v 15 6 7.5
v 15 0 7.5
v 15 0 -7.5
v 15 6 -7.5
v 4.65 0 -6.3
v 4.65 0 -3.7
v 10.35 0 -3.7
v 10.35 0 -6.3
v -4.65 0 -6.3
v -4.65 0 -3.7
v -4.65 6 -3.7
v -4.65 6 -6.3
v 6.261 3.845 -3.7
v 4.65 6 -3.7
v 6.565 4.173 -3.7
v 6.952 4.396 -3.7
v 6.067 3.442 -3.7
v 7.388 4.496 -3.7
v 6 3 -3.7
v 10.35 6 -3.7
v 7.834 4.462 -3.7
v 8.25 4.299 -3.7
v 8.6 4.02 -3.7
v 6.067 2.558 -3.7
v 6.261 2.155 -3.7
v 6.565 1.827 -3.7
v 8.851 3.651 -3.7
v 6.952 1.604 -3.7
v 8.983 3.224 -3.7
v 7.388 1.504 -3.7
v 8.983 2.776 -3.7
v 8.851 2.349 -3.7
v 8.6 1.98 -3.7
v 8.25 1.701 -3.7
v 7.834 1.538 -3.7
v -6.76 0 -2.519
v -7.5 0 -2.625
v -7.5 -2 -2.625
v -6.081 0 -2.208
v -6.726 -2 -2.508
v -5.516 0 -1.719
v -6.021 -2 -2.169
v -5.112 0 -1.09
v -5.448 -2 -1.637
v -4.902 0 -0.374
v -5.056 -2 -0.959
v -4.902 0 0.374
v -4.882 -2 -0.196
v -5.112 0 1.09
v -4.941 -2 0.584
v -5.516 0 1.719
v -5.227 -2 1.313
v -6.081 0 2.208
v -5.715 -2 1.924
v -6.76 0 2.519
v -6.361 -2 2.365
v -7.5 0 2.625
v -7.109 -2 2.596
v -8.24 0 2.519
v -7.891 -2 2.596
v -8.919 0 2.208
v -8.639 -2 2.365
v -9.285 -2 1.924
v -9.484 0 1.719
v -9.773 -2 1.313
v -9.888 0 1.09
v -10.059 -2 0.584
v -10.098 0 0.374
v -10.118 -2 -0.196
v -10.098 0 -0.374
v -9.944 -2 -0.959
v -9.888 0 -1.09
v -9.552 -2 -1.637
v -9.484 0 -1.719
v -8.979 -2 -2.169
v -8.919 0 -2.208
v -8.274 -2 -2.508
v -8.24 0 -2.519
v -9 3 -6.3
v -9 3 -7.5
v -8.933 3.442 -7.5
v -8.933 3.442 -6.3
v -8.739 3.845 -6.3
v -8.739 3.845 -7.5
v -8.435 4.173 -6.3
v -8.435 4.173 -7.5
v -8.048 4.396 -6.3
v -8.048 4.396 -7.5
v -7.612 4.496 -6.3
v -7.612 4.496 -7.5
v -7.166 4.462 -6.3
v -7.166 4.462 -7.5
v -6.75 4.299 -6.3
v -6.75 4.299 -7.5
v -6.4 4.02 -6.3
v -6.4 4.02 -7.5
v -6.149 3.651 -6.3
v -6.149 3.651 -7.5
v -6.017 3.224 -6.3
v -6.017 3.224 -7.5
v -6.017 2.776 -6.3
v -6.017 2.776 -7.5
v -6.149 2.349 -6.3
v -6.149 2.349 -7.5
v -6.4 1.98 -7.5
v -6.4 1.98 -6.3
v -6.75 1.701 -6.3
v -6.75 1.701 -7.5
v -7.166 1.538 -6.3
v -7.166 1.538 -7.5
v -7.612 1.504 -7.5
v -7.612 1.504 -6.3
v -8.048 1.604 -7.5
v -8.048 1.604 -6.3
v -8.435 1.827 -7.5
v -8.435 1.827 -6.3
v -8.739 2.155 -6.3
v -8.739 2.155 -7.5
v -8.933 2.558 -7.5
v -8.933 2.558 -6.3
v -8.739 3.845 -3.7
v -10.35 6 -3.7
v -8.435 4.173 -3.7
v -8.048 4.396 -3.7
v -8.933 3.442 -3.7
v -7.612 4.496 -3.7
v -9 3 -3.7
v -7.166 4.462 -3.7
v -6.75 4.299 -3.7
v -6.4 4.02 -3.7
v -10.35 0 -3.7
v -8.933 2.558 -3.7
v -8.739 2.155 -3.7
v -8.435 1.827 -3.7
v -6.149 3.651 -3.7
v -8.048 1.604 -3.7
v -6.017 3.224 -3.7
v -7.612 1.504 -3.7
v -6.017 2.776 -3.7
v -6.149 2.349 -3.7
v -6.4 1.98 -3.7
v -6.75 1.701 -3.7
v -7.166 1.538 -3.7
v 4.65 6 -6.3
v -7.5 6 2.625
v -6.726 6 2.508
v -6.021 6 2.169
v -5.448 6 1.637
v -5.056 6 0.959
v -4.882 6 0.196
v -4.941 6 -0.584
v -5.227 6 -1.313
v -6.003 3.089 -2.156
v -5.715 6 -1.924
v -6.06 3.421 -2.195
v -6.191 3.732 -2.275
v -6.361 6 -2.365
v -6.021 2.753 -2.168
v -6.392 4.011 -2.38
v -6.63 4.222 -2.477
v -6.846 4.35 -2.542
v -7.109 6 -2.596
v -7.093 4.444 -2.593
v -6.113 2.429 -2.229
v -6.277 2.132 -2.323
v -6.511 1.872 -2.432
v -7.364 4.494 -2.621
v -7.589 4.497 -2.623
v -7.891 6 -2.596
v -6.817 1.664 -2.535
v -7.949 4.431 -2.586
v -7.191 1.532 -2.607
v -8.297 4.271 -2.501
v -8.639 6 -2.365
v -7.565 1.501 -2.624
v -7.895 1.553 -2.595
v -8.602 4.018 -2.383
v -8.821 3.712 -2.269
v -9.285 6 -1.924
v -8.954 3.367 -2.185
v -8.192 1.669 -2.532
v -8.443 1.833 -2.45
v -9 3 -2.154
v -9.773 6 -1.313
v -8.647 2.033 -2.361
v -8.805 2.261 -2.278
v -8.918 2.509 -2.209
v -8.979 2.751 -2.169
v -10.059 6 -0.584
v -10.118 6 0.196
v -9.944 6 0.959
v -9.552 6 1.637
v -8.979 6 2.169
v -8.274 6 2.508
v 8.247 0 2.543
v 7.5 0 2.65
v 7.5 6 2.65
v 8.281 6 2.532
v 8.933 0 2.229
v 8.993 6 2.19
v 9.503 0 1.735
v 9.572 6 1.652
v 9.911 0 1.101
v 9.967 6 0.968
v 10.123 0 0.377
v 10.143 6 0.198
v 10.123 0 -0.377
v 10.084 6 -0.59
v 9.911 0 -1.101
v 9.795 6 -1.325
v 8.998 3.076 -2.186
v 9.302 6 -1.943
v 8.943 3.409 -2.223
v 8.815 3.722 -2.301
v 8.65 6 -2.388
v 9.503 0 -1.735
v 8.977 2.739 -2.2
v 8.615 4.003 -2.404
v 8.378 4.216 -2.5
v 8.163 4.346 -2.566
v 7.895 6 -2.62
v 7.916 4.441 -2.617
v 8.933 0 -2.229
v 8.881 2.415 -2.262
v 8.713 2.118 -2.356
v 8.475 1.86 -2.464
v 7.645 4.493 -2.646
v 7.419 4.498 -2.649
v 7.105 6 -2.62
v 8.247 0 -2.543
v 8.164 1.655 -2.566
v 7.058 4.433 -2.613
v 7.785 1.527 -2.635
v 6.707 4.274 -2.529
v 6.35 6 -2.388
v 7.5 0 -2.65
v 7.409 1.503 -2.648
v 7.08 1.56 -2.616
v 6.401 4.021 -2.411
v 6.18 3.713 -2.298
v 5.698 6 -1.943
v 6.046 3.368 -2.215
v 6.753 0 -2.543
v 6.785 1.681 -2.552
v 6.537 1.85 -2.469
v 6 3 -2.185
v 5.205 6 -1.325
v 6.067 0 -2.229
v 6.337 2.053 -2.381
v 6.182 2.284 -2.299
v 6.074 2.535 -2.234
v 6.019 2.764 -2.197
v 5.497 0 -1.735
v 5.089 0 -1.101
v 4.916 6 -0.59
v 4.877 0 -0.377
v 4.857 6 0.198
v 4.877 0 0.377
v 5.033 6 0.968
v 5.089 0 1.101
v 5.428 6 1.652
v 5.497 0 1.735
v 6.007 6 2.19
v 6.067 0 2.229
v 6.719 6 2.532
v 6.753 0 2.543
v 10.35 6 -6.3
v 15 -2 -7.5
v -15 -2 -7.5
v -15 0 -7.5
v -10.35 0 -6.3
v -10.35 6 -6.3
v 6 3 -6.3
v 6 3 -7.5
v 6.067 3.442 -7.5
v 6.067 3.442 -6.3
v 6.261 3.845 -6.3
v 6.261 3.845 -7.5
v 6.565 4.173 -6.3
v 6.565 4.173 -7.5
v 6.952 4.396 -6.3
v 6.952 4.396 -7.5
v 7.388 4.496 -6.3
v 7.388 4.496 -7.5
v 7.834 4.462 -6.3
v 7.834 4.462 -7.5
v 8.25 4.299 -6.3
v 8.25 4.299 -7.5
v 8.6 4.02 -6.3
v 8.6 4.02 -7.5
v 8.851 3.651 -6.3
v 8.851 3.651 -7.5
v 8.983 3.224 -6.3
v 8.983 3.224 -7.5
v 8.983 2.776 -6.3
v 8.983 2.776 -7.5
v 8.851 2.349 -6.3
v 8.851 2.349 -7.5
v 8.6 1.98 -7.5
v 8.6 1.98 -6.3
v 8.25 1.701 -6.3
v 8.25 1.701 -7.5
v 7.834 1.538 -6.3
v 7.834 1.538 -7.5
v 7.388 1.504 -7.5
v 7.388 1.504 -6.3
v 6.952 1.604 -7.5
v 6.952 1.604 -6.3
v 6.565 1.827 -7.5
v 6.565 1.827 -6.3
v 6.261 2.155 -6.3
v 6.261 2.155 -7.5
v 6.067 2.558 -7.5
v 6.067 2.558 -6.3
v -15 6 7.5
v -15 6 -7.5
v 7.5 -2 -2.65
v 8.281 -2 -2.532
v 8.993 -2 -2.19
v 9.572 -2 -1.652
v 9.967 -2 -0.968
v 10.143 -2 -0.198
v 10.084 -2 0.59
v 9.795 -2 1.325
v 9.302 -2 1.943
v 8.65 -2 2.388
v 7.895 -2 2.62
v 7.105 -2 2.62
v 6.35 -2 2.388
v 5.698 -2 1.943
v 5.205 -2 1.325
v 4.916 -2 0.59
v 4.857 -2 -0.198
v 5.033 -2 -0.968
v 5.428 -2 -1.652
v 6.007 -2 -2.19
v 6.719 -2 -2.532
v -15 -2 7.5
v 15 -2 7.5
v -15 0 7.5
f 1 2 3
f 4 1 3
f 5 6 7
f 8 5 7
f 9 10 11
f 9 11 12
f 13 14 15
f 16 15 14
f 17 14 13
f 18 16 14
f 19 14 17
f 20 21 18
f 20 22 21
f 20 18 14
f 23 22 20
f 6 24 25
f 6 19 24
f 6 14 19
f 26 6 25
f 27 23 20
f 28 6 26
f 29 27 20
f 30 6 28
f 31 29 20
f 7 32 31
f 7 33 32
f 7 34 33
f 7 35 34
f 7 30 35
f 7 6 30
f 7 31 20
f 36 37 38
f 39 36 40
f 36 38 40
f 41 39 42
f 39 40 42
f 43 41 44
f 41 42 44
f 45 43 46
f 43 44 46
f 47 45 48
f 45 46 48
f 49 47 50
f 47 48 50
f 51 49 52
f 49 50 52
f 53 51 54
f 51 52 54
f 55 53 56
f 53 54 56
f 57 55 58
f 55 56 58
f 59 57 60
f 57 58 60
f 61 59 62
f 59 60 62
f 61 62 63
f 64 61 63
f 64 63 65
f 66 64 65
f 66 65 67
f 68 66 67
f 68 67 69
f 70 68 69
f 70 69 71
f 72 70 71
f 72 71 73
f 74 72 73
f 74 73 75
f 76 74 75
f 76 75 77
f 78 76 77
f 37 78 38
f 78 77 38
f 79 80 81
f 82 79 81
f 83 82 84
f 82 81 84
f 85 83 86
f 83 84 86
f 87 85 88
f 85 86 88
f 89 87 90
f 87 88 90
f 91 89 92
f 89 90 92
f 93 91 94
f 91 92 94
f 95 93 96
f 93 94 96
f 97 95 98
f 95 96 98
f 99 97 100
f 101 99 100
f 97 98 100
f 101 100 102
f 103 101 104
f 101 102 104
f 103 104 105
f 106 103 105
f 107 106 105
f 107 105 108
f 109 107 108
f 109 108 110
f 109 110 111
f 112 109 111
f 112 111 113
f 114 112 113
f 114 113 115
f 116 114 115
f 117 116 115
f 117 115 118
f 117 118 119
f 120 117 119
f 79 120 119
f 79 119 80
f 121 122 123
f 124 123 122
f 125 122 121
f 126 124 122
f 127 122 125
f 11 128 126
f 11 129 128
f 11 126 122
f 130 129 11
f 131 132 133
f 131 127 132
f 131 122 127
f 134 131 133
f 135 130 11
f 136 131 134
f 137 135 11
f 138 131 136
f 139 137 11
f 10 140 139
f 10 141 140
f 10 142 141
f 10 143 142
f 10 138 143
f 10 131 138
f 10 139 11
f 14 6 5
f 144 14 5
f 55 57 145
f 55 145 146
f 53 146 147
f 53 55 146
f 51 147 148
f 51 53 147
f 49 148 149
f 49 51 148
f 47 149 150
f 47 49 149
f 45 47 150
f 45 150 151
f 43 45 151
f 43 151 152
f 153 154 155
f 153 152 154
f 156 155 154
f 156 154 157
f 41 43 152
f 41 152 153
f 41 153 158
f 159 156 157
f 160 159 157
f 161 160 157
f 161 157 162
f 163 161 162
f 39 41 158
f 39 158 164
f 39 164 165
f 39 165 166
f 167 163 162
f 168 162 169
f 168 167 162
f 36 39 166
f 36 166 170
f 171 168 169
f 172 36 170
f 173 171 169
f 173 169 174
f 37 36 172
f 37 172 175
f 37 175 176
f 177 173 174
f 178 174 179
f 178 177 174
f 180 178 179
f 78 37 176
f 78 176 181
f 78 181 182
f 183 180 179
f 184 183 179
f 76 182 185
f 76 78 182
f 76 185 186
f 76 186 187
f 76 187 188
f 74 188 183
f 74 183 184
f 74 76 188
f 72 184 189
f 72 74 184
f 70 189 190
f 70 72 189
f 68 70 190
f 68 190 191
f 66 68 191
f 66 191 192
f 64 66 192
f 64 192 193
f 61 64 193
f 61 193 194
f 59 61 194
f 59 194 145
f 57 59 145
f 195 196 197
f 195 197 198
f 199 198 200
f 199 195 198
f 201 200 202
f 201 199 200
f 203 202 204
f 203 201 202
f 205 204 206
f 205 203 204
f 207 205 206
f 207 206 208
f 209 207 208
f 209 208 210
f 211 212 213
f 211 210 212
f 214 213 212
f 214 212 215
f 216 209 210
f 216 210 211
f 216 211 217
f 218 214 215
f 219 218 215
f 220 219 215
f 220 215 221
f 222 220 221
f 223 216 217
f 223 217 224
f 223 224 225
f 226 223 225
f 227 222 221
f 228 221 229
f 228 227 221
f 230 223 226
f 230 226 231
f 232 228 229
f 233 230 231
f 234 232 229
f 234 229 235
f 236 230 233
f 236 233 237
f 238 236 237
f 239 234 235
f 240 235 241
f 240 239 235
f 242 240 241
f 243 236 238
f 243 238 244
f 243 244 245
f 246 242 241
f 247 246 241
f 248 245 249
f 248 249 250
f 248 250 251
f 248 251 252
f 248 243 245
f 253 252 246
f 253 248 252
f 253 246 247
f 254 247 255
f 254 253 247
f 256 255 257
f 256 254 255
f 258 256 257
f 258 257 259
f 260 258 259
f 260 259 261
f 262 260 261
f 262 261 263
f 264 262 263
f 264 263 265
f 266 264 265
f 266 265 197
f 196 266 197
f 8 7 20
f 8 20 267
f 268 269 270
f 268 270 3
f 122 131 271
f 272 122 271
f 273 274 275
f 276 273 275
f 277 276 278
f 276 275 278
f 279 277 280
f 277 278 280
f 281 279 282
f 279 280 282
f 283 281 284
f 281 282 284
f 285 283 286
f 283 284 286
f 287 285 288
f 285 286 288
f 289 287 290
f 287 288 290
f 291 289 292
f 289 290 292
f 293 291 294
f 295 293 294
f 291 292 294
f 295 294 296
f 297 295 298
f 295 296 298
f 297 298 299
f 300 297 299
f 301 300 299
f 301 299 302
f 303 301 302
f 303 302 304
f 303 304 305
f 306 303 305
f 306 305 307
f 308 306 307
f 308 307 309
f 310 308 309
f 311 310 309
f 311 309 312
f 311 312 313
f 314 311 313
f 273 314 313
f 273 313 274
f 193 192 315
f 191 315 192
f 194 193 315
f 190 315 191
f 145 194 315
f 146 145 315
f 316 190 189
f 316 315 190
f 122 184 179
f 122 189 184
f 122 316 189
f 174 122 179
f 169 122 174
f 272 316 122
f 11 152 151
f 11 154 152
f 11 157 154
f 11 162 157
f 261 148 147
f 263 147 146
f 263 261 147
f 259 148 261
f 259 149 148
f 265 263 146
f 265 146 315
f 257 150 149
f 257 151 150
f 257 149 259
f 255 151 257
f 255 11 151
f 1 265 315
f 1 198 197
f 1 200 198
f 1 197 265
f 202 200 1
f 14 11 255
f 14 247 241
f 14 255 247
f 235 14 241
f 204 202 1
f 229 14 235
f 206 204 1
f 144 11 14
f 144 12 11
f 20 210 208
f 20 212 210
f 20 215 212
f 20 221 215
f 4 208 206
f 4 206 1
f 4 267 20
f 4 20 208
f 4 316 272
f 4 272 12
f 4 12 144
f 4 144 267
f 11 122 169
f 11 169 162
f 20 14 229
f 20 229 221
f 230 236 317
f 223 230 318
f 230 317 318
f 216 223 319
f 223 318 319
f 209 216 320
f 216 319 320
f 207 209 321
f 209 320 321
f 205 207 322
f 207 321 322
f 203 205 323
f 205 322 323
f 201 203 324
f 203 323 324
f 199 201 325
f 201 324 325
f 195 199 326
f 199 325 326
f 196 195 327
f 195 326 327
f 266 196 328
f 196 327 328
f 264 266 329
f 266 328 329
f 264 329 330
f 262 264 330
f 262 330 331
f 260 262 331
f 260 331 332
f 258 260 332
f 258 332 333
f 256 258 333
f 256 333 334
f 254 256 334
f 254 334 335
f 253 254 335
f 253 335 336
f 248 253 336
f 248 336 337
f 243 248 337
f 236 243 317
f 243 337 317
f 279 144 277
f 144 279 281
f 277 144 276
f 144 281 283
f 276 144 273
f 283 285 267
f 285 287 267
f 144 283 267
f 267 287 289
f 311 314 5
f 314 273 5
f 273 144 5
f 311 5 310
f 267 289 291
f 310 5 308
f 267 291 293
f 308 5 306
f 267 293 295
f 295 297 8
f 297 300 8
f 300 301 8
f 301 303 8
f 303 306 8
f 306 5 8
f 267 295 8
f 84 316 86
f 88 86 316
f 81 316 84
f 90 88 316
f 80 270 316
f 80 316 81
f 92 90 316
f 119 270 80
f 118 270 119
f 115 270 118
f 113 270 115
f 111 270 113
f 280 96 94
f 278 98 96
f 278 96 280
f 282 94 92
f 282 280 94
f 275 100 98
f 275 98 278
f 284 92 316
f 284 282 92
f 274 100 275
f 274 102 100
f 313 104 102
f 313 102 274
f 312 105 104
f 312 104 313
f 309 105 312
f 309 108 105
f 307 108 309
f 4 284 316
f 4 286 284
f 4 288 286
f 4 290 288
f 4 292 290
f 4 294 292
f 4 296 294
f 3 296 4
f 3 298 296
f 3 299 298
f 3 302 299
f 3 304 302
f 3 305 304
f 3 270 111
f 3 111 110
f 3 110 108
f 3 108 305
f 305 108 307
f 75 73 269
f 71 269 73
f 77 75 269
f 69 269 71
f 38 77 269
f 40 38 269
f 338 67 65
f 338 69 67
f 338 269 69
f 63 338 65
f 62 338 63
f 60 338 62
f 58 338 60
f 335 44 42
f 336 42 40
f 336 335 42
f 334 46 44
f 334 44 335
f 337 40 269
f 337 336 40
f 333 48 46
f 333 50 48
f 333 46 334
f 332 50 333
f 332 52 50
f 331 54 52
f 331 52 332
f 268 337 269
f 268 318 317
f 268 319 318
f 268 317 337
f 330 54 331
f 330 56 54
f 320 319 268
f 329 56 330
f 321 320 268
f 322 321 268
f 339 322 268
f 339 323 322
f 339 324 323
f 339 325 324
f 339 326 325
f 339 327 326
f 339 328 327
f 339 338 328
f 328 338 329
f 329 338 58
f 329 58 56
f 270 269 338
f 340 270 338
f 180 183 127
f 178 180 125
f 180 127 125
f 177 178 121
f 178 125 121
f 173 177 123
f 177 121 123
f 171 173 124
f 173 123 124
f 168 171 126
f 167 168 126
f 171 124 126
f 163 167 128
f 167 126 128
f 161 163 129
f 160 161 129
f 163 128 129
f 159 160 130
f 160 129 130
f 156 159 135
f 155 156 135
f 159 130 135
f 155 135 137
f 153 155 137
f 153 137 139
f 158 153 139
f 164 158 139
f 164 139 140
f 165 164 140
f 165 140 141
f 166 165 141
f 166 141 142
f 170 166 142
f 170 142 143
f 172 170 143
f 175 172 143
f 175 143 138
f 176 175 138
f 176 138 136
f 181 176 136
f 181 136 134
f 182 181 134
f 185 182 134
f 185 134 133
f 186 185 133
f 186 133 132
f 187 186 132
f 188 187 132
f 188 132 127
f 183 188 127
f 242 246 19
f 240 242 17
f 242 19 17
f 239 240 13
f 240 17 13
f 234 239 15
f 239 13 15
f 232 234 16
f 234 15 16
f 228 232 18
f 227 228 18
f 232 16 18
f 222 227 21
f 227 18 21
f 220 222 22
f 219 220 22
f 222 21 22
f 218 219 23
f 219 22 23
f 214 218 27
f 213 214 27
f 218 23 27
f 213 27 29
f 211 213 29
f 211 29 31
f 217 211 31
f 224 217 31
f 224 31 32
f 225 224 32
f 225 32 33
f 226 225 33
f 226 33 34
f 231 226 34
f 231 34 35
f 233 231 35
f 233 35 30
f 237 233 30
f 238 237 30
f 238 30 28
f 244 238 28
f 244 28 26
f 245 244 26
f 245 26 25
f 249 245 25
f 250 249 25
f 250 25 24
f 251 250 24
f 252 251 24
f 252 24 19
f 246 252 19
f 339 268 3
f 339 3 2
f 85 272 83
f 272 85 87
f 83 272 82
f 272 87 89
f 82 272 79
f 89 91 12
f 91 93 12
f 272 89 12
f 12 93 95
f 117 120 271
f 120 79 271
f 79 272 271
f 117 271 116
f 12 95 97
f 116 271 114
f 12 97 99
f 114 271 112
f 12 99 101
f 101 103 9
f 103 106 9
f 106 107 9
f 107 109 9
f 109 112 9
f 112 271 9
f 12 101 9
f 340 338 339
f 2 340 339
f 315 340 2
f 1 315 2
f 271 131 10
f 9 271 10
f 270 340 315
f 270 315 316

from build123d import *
from build123d.topology import SkipClean

# Parameters (mm, degrees)
SKETCH1_W           = 30
SKETCH1_H           = 15
SKETCH1_R           = 2.625
SKETCH1_R_2         = 2.65
SKETCH1_W_2         = 5.7
SKETCH1_H_2         = 2.6
BOSS_EXTRUDE1_DEPTH = 6
SKETCH3_R           = 1.5
CUT_EXTRUDE1_DEPTH  = 8
BOSS_EXTRUDE2_START = 2
SKETCH4_W           = 30
SKETCH4_H           = 15
SKETCH4_R           = 2.625
SKETCH4_R_2         = 2.65
BOSS_EXTRUDE2_DEPTH = 2


with BuildPart() as part:
    # Sketch1 → Boss-Extrude1 (new body)
    with BuildSketch(Plane(origin=(0, 0, 0), x_dir=(1, 0, 0), z_dir=(0, 1, 0))):
        Rectangle(SKETCH1_W, SKETCH1_H)
        with Locations(Location((-7.5, 0, 0), (0, 0, 270))):
            Circle(SKETCH1_R, mode=Mode.SUBTRACT)
        with Locations(Location((7.5, 0, 0), (0, 0, 270))):
            Circle(SKETCH1_R_2, mode=Mode.SUBTRACT)
        with Locations((-7.5, 5)):
            Rectangle(SKETCH1_W_2, SKETCH1_H_2, mode=Mode.SUBTRACT)
        with Locations((7.5, 5)):
            Rectangle(SKETCH1_W_2, SKETCH1_H_2, mode=Mode.SUBTRACT)
    extrude(amount=BOSS_EXTRUDE1_DEPTH)

    # Sketch3 → Cut-Extrude1 (cut)
    with BuildSketch(Plane(origin=(0, 0, -7.5), x_dir=(-1, 0, 0), z_dir=(0, 0, -1))):
        with Locations((7.5, 3)):
            Circle(SKETCH3_R)
        with Locations((-7.5, 3)):
            Circle(SKETCH3_R)
    extrude(amount=-CUT_EXTRUDE1_DEPTH, mode=Mode.SUBTRACT)

    # Sketch4 → Boss-Extrude2 (add)
    with SkipClean():  # the faces are left unmerged after this step: merging them gives an invalid solid
        with BuildSketch(Plane.XZ.offset(BOSS_EXTRUDE2_START)):
            Rectangle(SKETCH4_W, SKETCH4_H)
            with Locations(Location((-7.5, 0, 0), (0, 0, 270))):
                Circle(SKETCH4_R, mode=Mode.SUBTRACT)
            with Locations(Location((7.5, 0, 0), (0, 0, 270))):
                Circle(SKETCH4_R_2, mode=Mode.SUBTRACT)
        extrude(amount=-BOSS_EXTRUDE2_DEPTH)


solid = part.part
